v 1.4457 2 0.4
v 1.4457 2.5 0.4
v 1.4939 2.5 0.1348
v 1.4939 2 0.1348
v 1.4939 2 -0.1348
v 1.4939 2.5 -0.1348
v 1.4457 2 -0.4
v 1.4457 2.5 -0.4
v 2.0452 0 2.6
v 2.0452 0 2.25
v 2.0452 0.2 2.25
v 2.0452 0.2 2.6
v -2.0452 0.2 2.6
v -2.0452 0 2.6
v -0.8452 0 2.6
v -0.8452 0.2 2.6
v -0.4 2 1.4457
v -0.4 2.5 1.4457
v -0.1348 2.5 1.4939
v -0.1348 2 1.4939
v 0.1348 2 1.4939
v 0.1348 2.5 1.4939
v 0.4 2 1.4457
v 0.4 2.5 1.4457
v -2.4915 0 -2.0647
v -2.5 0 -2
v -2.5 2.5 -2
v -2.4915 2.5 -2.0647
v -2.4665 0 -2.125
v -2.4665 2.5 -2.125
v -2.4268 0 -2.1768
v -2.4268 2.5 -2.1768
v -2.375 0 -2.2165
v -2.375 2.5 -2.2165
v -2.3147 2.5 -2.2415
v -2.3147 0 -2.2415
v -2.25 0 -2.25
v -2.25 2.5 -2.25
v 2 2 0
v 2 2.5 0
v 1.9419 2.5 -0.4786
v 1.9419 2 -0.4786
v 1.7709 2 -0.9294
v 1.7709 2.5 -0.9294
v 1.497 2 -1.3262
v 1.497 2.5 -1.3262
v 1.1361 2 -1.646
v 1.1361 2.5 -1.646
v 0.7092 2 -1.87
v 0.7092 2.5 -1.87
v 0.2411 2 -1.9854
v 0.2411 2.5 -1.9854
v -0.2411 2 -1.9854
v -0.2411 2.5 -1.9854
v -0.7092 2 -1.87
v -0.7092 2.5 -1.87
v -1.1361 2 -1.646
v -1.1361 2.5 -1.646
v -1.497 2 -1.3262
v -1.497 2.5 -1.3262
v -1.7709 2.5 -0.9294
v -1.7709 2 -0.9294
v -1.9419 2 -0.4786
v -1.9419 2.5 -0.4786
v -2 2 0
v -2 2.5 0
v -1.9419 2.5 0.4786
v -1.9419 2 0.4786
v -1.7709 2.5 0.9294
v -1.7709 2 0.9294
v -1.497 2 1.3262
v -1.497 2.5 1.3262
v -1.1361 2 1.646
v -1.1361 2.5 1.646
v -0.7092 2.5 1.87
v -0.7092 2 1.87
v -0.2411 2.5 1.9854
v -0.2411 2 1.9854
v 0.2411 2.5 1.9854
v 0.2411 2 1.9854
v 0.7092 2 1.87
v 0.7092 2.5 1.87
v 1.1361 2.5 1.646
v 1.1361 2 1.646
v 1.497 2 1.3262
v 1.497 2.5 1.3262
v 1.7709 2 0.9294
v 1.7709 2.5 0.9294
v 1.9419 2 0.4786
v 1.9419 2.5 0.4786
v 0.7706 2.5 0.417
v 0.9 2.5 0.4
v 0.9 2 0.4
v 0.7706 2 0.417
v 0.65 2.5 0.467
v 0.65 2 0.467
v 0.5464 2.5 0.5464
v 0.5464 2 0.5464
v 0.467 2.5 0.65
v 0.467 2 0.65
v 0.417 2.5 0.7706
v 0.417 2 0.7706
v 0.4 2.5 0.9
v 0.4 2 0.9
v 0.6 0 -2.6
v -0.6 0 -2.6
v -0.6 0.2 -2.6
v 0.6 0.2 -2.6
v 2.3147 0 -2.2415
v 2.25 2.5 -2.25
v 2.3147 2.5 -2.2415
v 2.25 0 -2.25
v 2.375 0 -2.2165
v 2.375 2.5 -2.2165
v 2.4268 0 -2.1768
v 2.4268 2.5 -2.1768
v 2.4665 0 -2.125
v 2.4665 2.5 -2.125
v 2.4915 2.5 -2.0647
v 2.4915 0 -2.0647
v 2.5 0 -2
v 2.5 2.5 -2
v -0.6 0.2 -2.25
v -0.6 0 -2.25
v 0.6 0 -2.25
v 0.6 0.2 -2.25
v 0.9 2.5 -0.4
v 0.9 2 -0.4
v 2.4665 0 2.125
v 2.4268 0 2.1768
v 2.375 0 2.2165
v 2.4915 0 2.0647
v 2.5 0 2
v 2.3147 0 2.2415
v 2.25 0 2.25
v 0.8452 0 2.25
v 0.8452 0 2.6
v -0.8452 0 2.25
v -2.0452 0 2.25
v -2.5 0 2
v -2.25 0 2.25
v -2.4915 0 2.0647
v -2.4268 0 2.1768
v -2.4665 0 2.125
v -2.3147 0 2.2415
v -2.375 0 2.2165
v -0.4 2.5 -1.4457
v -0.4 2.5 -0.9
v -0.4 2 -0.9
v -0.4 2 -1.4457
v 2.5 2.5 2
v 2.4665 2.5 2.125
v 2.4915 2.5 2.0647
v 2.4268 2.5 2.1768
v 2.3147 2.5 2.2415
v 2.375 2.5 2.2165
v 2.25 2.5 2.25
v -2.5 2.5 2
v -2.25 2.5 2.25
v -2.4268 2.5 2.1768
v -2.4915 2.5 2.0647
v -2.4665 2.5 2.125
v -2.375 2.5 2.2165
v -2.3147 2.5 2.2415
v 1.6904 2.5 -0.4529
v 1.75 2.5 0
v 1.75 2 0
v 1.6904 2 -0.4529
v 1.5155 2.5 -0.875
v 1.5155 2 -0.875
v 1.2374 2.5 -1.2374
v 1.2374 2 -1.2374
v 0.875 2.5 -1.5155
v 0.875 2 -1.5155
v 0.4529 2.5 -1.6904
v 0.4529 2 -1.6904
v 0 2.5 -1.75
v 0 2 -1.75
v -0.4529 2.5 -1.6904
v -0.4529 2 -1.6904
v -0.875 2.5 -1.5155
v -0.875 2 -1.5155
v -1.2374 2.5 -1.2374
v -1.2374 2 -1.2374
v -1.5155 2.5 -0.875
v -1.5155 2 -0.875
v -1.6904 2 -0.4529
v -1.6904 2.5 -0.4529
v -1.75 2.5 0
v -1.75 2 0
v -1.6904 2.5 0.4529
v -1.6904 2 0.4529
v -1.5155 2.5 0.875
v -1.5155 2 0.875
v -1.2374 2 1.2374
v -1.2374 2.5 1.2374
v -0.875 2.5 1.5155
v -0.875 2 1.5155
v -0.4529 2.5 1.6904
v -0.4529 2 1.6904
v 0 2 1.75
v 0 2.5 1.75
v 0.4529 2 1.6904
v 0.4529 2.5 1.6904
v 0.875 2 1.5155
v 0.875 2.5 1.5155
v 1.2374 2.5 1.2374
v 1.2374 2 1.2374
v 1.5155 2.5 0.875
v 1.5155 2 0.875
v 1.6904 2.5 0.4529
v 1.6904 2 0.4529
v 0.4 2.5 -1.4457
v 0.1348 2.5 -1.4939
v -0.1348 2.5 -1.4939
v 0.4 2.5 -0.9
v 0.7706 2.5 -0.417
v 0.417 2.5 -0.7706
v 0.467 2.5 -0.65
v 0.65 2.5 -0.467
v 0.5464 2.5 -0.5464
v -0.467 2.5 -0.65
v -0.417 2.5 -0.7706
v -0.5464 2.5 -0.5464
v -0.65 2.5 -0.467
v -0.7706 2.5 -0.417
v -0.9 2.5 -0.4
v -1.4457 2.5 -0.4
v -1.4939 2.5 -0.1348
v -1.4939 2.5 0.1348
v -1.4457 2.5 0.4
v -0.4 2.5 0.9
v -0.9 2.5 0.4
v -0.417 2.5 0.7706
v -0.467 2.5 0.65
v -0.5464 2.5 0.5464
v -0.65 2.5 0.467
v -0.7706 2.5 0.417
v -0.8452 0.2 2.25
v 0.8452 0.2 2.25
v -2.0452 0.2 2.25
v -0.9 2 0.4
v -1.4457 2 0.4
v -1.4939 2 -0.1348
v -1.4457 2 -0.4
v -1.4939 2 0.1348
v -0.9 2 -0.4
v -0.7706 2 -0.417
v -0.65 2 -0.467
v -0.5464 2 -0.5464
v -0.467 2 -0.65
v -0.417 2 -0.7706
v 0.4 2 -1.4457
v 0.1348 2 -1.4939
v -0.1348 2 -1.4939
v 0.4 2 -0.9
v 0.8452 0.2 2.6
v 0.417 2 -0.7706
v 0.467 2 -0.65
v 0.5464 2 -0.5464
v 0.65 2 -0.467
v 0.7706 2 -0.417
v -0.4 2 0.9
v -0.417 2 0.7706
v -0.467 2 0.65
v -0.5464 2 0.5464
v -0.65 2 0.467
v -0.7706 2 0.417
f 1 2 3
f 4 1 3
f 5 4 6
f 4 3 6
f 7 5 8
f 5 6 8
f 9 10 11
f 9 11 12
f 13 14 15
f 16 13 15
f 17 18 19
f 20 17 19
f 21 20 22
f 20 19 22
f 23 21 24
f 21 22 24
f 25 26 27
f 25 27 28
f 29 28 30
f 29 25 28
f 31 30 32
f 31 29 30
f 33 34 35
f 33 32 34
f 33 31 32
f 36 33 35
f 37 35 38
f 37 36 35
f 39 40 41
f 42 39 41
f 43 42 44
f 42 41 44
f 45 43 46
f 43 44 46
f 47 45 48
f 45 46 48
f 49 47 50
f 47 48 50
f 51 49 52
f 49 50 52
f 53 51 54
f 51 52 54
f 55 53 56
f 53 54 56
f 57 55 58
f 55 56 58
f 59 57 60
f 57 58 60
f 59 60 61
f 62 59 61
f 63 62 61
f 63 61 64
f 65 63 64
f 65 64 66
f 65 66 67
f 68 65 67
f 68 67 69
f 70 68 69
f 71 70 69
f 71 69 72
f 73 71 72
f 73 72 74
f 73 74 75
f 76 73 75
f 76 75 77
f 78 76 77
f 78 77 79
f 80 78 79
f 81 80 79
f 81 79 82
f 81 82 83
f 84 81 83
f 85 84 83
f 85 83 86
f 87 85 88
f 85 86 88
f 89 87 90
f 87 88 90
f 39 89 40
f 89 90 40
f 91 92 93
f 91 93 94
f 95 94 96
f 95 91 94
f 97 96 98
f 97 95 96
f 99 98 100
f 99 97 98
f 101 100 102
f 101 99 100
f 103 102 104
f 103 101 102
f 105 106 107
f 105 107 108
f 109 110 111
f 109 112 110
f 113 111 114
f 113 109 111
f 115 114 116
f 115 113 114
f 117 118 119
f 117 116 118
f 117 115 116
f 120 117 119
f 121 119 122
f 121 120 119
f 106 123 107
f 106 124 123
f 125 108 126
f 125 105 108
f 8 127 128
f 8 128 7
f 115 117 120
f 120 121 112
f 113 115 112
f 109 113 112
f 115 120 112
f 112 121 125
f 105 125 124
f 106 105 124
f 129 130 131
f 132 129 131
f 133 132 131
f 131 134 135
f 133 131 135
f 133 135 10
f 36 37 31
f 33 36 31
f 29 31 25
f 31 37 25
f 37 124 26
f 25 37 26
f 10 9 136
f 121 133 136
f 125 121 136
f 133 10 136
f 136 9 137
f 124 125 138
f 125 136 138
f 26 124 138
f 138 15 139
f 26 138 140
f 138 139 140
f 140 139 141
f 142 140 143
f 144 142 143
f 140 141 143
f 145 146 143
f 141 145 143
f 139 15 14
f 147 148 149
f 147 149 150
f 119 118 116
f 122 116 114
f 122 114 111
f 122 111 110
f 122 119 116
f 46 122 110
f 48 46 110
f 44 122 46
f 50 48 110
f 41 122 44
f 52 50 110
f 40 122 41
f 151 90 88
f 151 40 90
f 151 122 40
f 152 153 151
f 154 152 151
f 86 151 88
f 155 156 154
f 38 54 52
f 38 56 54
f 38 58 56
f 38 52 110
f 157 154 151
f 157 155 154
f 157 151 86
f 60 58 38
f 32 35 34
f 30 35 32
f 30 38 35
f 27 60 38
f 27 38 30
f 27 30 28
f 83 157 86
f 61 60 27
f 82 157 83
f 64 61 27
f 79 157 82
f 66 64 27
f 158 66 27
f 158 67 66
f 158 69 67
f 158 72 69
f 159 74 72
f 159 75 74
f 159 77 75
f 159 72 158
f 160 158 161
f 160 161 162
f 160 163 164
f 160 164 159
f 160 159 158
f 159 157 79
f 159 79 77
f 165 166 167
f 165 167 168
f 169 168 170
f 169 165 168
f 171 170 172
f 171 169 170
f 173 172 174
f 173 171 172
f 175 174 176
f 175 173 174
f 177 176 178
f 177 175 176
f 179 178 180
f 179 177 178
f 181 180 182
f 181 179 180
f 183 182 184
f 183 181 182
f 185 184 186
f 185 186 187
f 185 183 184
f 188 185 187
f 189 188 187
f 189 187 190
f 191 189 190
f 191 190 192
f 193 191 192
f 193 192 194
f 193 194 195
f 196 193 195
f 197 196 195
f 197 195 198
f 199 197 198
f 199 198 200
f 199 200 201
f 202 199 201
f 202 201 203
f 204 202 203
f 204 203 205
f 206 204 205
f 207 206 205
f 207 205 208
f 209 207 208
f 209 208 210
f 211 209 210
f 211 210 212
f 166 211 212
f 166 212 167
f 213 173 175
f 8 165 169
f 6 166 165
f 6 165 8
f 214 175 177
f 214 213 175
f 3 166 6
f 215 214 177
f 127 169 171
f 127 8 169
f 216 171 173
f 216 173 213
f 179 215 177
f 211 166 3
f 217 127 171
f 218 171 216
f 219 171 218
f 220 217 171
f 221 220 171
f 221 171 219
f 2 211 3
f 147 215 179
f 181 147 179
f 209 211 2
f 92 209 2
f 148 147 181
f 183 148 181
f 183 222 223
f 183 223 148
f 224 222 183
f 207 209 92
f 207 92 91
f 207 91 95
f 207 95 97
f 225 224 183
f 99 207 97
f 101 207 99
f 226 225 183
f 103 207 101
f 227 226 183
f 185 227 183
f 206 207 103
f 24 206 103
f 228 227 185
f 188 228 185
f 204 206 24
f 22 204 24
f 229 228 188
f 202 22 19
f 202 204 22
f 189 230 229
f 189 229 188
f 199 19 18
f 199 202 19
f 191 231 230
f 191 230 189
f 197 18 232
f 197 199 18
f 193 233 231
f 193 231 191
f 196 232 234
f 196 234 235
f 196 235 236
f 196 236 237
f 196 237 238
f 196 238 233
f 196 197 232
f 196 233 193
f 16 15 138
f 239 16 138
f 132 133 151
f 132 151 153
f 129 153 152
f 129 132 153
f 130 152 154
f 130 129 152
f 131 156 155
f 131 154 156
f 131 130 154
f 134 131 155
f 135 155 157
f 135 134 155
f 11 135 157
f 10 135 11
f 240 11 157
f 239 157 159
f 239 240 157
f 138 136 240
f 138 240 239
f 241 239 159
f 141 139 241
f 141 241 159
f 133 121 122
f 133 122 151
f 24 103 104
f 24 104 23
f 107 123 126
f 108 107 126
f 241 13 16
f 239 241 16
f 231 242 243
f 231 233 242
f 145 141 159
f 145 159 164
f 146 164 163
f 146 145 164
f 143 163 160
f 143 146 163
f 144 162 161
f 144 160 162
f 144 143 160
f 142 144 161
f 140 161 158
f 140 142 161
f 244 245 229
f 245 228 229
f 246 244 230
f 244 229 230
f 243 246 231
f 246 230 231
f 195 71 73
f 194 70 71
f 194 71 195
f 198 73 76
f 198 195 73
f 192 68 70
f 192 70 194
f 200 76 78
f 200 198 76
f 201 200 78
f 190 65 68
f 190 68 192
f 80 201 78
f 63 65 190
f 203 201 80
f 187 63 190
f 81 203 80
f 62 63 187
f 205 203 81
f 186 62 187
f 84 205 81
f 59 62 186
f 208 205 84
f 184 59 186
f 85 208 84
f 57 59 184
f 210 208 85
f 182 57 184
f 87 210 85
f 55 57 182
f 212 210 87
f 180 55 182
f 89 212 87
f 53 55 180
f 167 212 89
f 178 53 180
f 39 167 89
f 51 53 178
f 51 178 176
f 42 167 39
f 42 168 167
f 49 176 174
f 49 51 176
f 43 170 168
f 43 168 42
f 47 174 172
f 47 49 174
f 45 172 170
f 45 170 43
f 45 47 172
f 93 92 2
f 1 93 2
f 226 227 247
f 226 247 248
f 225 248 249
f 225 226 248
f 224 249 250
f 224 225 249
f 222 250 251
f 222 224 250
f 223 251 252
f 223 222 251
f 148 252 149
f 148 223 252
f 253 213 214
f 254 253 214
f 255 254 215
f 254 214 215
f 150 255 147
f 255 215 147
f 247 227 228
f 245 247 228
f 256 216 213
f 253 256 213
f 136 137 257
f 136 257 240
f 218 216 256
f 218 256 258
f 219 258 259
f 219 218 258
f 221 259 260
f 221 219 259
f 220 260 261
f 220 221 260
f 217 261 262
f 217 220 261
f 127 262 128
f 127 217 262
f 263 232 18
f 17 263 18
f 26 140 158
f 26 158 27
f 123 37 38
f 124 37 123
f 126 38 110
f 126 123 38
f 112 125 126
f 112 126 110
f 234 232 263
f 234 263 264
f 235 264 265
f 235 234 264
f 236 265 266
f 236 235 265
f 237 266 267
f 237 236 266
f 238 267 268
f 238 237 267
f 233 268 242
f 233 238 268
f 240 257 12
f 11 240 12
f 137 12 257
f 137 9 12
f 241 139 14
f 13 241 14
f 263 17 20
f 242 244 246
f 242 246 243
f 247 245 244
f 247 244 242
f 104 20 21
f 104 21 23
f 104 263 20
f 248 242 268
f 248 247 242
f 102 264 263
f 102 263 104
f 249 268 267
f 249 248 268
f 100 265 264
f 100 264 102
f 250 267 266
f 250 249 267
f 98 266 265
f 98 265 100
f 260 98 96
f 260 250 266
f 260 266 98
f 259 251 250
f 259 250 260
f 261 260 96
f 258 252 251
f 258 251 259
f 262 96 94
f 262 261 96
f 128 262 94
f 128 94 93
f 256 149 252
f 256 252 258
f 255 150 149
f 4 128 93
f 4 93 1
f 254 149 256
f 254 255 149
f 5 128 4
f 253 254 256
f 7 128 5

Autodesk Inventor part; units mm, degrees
ref_plane "YZ Plane" through (0, 0, 0) normal (1, 0, 0) x (0, 1, 0)
ref_plane "XZ Plane" through (0, 0, 0) normal (0, 1, 0) x (-1, 0, 0)
ref_plane "XY Plane" through (0, 0, 0) normal (0, 0, 1) x (1, 0, 0)
sketch "スケッチ1" plane through (0, 0, 0) normal (0, 1, 0) x (-1, 0, 0)
  line L0 (2.25, -2.25) -> (-2.25, -2.25)
  line L1 (-2.5, -2) -> (-2.5, 2)
  line L2 (-2.25, 2.25) -> (2.25, 2.25)
  line L3 (2.5, 2) -> (2.5, -2)
  line L4 (2.5, 0) -> (-2.5, 0) construction
  line L5 (0, -2.25) -> (0, 2.25) construction
  arc A0 (2.25, -2.25) -> (2.5, -2) centre (2.25, -2) ccw
  arc A1 (-2.5, -2) -> (-2.25, -2.25) centre (-2.25, -2) ccw
  arc A2 (-2.25, 2.25) -> (-2.5, 2) centre (-2.25, 2) ccw
  arc A3 (2.5, 2) -> (2.25, 2.25) centre (2.25, 2) ccw
  point P0 (0, 0)
  point P1 (2.5, -2.25)
  point P2 (-2.5, -2.25)
  point P3 (2.5, 2.25)
  dimension "d0" = 4.5
  dimension "d1" = 5
  dimension "d2" = 0.25
extrude "押し出し1" add sketch "スケッチ1" along normal blind 2.5
sketch "スケッチ2" plane through (0, 2.5, 0) normal (0, 1, 0) x (1, 0, 0)
  circle A0 centre (0, 0) radius 1.75
  circle A1 centre (0, 0) radius 2
  line L0 (1.5, 0) -> (0, 0) construction
  line L1 (0, 0) -> (0, 1.5) construction
  arc A2 (0.4, 1.4457) -> (-0.4, 1.4457) centre (0, 0) ccw
  arc A3 (1.4457, -0.4) -> (1.4457, 0.4) centre (0, 0) ccw
  arc A4 (0.4, 0.9) -> (0.9, 0.4) centre (0.9, 0.9) ccw
  line L2 (0.9, 0.4) -> (1.4457, 0.4)
  line L3 (0.4, 0.9) -> (0.4, 1.4457)
  arc A5 (-0.4, -1.4457) -> (0.4, -1.4457) centre (0, 0) ccw
  arc A6 (0.9, -0.4) -> (0.4, -0.9) centre (0.9, -0.9) ccw
  line L4 (0.9, -0.4) -> (1.4457, -0.4)
  line L5 (0.4, -0.9) -> (0.4, -1.4457)
  arc A7 (-1.4457, 0.4) -> (-1.4457, -0.4) centre (0, 0) ccw
  arc A8 (-0.9, 0.4) -> (-0.4, 0.9) centre (-0.9, 0.9) ccw
  line L6 (-0.9, 0.4) -> (-1.4457, 0.4)
  line L7 (-0.4, 0.9) -> (-0.4, 1.4457)
  line L8 (-0.4, -0.9) -> (-0.4, -1.4457)
  arc A9 (-0.4, -0.9) -> (-0.9, -0.4) centre (-0.9, -0.9) ccw
  line L9 (-0.9, -0.4) -> (-1.4457, -0.4)
  point P0 (0, -1.5)
  dimension "d5" = 0.8
  dimension "d6" = 0.8
  dimension "d7" = 1.5
  dimension "d8" = 0.5
  dimension "d9" = 3.5
  dimension "d10" = 4
extrude "押し出し2" cut sketch "スケッチ2" against normal blind 0.5
sketch "スケッチ3" plane through (0, 0, 0) normal (0, -1, 0) x (1, 0, 0)
  line L0 (2.25, -2.25) -> (-2.25, -2.25) construction
  line L1 (0.6, -2.25) -> (-0.6, -2.25)
  line L2 (-0.6, -2.25) -> (-0.6, -2.6)
  line L3 (-0.6, -2.6) -> (0.6, -2.6)
  line L4 (0.6, -2.6) -> (0.6, -2.25)
  line L5 (2.25, 2.25) -> (-2.25, 2.25) construction
  line L6 (-0.8452, 2.25) -> (-2.0452, 2.25)
  line L7 (-2.0452, 2.25) -> (-2.0452, 2.6)
  line L8 (-2.0452, 2.6) -> (-0.8452, 2.6)
  line L9 (-0.8452, 2.6) -> (-0.8452, 2.25)
  line L10 (0, 0) -> (0, 2.25) construction
  line L11 (0, 0) -> (-3.3171, 0) construction
  line L12 (0.8452, 2.25) -> (2.0452, 2.25)
  line L13 (2.0452, 2.25) -> (2.0452, 2.6)
  line L14 (2.0452, 2.6) -> (0.8452, 2.6)
  line L15 (0.8452, 2.6) -> (0.8452, 2.25)
  dimension "d14" = 5.2
  dimension "d15" = 1.2
  dimension "d16" = 1.2
extrude "押し出し3" add sketch "スケッチ3" against normal blind 0.2
properties part number "20_018_SMD_VOLUME_G43A_R1"
